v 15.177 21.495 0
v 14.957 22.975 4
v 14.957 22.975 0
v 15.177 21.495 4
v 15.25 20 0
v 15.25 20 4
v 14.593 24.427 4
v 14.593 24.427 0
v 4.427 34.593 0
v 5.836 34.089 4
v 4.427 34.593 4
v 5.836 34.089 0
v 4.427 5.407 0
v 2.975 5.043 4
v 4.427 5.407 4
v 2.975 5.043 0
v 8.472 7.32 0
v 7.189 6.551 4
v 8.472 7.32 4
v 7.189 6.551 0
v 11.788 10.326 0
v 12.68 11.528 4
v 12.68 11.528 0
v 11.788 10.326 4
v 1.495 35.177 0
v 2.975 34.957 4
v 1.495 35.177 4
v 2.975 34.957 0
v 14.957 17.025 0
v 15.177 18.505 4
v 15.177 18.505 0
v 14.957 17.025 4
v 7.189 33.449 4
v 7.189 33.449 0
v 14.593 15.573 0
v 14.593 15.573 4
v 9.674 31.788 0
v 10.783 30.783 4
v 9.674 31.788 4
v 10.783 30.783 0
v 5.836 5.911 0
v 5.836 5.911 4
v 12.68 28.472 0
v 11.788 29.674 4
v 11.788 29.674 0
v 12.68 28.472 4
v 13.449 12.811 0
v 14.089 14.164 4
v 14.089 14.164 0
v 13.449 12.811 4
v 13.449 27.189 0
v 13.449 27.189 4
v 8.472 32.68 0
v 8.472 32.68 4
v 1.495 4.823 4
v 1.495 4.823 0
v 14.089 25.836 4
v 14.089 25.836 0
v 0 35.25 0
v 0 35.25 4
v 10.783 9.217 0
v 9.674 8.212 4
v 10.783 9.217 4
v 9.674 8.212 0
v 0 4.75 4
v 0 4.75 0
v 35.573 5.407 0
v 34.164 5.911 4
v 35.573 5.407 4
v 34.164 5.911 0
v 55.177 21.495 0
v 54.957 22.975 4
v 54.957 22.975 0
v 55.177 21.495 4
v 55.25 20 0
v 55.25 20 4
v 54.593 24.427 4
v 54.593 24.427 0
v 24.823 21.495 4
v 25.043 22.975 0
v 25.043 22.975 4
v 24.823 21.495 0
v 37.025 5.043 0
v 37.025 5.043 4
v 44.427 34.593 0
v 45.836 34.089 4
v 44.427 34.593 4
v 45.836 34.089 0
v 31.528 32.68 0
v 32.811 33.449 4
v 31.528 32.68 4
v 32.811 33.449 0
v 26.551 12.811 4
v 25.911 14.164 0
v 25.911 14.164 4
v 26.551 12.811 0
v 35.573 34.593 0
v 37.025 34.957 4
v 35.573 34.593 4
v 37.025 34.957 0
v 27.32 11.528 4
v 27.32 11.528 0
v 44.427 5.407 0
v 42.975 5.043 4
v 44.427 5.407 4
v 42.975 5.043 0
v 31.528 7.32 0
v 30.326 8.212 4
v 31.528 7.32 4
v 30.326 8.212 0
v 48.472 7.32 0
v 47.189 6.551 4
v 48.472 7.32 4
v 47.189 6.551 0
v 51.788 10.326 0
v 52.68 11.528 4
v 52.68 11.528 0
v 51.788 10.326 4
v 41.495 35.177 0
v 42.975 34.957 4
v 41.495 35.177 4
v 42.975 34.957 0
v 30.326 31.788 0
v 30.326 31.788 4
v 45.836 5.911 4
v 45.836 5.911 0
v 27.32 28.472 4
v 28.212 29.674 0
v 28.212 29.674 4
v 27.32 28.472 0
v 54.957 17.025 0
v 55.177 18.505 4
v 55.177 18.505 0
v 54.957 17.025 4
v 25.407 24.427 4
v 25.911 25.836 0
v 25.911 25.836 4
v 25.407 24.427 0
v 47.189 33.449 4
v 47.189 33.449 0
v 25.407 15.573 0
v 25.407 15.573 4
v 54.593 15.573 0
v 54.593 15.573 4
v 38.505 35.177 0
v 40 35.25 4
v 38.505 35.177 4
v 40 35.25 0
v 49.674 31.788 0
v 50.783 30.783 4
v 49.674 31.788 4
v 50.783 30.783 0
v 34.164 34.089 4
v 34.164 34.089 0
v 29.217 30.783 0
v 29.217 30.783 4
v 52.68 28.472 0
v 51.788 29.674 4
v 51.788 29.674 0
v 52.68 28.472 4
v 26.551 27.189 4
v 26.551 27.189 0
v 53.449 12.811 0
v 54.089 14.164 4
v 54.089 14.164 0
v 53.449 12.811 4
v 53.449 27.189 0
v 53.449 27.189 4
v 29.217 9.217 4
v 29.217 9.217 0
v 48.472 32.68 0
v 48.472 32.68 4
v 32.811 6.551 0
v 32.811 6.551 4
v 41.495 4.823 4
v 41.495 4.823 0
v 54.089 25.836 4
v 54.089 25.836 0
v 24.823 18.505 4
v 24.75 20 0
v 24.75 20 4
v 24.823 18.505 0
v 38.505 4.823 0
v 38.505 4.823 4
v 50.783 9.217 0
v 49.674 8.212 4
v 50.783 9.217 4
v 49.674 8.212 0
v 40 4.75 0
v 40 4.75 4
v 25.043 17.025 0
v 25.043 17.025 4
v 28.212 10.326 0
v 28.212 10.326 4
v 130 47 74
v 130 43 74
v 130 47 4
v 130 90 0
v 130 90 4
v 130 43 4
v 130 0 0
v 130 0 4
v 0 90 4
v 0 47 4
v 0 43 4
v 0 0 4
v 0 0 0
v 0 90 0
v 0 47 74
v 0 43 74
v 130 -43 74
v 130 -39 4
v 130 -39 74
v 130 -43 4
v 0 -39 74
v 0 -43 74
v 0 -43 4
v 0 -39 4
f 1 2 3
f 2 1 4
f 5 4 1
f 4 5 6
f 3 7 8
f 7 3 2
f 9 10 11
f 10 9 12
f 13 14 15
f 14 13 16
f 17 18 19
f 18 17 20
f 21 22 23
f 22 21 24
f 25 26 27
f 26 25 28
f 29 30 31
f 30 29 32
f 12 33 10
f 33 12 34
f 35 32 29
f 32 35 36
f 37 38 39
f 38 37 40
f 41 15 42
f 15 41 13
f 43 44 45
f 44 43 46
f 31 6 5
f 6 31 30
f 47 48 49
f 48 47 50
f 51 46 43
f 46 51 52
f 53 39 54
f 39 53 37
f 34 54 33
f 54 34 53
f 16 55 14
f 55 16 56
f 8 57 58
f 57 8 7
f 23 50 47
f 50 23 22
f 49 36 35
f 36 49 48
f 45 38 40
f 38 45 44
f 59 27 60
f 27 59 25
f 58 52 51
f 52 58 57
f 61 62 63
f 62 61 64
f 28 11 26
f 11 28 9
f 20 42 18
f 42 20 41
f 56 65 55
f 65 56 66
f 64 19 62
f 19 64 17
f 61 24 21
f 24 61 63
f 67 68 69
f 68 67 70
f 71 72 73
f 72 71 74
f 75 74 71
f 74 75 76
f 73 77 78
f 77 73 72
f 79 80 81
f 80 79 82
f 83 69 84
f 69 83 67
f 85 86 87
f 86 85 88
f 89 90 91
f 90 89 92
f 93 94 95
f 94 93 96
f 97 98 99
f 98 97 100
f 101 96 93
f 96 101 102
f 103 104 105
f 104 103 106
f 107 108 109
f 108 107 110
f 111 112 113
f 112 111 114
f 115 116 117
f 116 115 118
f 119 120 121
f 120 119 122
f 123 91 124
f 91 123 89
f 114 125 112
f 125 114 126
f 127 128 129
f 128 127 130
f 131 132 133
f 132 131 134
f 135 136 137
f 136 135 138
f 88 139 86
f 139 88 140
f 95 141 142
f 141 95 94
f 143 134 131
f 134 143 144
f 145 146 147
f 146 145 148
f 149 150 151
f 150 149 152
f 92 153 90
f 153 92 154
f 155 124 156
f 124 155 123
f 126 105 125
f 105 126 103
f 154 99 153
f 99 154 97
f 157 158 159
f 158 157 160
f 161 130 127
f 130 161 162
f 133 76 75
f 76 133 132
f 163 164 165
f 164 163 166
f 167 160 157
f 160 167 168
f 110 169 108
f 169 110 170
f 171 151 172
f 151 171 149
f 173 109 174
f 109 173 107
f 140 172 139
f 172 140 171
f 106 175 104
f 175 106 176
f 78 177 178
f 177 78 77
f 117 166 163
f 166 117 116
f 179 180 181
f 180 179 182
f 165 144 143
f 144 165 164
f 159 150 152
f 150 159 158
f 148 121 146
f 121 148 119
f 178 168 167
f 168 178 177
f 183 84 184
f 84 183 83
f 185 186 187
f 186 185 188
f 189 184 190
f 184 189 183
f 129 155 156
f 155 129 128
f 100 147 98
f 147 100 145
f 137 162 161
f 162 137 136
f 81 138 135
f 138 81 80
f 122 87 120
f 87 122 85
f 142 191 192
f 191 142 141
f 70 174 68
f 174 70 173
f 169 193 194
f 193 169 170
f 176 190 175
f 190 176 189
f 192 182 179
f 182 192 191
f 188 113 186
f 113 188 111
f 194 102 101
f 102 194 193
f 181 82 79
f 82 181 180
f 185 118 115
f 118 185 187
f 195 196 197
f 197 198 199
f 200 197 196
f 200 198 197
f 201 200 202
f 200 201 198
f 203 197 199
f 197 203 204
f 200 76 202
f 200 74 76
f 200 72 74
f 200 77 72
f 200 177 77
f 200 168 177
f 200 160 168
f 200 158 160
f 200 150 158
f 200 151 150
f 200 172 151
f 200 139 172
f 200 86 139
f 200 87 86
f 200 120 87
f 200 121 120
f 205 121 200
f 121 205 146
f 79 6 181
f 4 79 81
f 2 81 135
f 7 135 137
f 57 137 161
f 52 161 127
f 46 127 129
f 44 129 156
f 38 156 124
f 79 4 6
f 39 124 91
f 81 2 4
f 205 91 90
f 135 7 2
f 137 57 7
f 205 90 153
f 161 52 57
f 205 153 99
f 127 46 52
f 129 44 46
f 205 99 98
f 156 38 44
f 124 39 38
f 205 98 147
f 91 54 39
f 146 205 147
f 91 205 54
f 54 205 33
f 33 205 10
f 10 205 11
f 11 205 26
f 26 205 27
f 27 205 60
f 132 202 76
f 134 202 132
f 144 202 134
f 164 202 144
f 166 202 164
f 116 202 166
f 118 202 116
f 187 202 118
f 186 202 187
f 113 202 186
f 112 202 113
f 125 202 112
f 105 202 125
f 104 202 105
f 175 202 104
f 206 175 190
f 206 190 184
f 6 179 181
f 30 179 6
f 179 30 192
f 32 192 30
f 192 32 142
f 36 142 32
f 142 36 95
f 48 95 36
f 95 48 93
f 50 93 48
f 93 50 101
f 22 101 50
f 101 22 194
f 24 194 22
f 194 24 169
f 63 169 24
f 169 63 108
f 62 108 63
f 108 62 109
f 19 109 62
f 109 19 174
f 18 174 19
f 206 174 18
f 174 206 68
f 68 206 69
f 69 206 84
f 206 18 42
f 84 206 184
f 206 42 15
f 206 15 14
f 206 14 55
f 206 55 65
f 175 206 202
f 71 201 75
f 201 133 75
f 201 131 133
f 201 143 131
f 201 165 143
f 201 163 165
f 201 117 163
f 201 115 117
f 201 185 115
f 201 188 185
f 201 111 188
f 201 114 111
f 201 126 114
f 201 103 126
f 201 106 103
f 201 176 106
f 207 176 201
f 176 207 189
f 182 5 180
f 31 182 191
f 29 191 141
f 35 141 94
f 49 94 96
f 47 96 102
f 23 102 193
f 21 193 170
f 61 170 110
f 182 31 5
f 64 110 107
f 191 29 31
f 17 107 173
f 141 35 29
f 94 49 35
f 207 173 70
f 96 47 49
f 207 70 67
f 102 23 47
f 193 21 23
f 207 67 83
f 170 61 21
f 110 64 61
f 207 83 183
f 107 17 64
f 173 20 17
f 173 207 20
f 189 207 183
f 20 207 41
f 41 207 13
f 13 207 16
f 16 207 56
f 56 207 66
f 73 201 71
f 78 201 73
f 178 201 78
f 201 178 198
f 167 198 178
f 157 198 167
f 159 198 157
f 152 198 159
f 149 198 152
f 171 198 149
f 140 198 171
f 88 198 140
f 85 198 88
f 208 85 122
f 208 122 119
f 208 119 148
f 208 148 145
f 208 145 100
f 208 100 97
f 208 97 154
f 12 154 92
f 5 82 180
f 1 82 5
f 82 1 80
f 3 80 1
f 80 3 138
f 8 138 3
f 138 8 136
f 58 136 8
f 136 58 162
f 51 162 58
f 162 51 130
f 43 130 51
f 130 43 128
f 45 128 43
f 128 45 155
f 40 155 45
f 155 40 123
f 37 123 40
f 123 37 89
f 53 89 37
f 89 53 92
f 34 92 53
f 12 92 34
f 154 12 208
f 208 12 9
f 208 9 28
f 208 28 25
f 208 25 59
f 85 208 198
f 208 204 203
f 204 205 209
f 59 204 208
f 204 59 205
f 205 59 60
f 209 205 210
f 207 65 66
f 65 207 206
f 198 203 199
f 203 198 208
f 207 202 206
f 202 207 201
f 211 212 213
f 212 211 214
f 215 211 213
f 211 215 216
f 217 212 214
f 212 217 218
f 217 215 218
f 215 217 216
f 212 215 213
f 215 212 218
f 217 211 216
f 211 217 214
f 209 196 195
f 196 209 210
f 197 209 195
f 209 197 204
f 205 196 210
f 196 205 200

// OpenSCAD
// Tube rack for 6x 50 mL conical tubes
// Print orientation: plate on bed, walls rise up. Flipped after print.

// Plate dimensions
plate_x = 130;
plate_y = 90;
plate_z = 4;

// Hole parameters
hole_dia = 30.5;
hole_radius = hole_dia / 2;

// Hole grid: 2 rows (Y), 3 columns (X)
rows = 2;
cols = 3;
pitch_x = 40;
pitch_y = 40;

// Wall parameters
wall_length_x = 130;
wall_thickness_y = 4;
wall_height = 70;

// Global fineness for round holes
$fn = 64;

// Calculate grid offsets to centre the holes on the plate
offset_x = (cols - 1) * pitch_x / 2;
offset_y = (rows - 1) * pitch_y / 2;

module rack() {
    // Plate
    difference() {
        cube([plate_x, plate_y, plate_z], center = false);
        
        // Six through-holes
        for (i = [0 : cols - 1]) {
            for (j = [0 : rows - 1]) {
                translate([
                    -offset_x + i * pitch_x,
                    -offset_y + j * pitch_y,
                    -0.01
                ]) {
                    cylinder(d = hole_dia, h = plate_z + 0.02, center = false);
                }
            }
        }
    }
    
    // Two long walls (along X, at Y = ±plate_y/2)
    translate([0, -plate_y/2 + wall_thickness_y/2, plate_z]) {
        cube([wall_length_x, wall_thickness_y, wall_height], center = false);
    }
    
    translate([0, plate_y/2 - wall_thickness_y/2, plate_z]) {
        cube([wall_length_x, wall_thickness_y, wall_height], center = false);
    }
}

rack();
